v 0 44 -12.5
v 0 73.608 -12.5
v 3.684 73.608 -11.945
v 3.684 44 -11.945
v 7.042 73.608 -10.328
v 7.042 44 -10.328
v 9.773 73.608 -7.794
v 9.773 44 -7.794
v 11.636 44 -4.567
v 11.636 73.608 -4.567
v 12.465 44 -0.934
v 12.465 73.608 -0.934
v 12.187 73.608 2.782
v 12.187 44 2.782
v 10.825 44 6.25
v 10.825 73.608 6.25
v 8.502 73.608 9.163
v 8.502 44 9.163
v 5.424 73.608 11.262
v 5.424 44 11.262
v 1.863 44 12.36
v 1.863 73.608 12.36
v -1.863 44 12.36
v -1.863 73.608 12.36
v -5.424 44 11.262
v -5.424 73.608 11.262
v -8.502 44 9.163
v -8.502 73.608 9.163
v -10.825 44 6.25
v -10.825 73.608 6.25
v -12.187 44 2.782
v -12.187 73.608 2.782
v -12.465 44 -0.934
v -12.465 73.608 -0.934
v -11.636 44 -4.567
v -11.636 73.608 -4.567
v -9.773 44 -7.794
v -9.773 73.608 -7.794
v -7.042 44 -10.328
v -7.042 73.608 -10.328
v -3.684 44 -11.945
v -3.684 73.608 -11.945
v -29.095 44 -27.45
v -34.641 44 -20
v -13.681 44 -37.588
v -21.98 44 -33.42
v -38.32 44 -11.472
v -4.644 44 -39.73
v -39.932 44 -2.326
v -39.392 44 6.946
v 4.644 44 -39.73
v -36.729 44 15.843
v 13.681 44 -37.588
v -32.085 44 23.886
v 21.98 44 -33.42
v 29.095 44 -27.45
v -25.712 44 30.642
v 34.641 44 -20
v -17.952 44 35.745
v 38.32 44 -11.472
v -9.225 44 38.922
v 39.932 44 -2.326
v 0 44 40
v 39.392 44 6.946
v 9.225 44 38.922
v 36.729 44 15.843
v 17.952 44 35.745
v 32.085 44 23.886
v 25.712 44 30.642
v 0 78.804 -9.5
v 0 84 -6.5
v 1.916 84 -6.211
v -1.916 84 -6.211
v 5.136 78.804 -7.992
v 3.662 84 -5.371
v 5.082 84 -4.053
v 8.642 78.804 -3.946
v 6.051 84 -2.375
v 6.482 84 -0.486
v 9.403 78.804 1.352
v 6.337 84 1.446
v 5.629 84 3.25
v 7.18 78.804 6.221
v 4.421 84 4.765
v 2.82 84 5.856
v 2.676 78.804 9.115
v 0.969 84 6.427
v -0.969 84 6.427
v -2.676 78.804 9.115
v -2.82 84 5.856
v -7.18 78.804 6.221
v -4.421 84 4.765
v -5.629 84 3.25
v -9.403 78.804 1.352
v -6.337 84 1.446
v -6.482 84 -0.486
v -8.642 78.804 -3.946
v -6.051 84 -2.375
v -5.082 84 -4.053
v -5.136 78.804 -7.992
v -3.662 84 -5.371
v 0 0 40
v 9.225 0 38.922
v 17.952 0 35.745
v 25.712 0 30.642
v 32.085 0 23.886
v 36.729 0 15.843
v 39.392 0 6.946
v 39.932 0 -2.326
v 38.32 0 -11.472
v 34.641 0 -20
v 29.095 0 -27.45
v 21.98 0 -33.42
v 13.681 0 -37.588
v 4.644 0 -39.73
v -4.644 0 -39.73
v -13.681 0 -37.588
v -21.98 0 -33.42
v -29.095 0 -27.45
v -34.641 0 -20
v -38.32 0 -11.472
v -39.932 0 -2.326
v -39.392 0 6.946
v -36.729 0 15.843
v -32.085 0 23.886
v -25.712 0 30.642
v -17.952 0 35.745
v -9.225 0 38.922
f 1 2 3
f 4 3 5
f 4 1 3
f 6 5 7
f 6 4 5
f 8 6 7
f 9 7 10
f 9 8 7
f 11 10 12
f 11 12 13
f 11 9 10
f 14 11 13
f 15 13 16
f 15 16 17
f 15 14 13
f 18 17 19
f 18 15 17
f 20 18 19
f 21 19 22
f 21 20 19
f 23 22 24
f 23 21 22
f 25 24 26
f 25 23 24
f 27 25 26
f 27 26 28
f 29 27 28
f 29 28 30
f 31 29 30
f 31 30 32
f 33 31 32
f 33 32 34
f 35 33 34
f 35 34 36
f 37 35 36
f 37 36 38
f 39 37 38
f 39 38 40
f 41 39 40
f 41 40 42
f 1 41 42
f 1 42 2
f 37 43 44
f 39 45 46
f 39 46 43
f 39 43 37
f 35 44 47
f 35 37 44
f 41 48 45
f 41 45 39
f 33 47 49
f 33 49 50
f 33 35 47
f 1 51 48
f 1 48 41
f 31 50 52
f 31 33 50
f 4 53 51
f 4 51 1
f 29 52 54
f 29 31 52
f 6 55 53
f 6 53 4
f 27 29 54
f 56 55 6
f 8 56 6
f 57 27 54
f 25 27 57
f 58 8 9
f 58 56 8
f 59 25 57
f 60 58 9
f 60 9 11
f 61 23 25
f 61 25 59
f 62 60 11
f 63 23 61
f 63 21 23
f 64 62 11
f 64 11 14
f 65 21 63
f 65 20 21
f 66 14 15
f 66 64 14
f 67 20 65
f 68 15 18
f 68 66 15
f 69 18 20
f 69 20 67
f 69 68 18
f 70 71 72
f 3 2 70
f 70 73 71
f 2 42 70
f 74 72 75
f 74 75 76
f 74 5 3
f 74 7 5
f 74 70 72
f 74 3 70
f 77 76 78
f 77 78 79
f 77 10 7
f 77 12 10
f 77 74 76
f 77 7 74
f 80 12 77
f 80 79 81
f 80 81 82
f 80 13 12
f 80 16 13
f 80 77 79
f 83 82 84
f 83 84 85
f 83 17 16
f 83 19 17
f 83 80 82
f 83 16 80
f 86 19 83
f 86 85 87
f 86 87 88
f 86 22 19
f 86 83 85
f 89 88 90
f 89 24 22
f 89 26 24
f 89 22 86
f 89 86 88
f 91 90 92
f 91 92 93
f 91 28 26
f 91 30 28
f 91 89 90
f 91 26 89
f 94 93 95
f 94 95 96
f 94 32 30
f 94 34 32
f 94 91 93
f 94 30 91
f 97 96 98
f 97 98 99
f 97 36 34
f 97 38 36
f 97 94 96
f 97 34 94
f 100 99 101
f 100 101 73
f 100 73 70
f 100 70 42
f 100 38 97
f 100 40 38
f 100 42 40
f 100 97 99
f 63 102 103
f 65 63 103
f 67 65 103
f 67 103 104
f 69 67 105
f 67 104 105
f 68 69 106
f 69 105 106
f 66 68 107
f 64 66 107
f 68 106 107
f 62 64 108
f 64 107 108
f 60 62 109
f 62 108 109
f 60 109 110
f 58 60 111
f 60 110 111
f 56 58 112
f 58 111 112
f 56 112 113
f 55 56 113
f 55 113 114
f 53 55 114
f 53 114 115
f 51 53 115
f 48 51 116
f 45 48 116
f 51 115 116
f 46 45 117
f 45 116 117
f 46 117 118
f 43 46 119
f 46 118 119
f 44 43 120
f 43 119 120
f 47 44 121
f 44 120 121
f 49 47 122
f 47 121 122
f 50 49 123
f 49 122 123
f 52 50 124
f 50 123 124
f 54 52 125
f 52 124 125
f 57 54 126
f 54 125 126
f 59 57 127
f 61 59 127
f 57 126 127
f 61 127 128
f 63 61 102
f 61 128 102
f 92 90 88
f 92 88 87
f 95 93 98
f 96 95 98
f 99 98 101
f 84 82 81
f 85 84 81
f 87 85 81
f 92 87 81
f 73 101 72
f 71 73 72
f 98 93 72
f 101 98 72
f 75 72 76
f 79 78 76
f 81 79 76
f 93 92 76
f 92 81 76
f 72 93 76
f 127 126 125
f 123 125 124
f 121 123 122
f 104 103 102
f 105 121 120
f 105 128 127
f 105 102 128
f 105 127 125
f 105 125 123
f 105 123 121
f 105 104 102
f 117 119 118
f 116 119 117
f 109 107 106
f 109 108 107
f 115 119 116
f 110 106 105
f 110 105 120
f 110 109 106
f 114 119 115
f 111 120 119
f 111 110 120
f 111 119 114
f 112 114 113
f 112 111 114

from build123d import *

# Parameters (mm, degrees)
SKETCH_1_R      = 40
EXTRUDE_1_DEPTH = 44
SKETCH_3_R      = 12.5
EXTRUDE_2_DEPTH = 84
CHAMFER_1_SIZE  = 6
CHAMFER_1_SIZE2 = 10.392304845


with BuildPart() as part:
    # 草图1 → 凸台-拉伸1 (new body)
    with BuildSketch(Plane(origin=(0, 0, 0), x_dir=(1, 0, 0), z_dir=(0, 1, 0))):
        with Locations(Location((0, 0, 0), (0, 0, 270))):
            Circle(SKETCH_1_R)
    extrude(amount=EXTRUDE_1_DEPTH)

    # 草图3 → 凸台-拉伸2 (add)
    with BuildSketch(Plane.XZ):
        with Locations(Location((0, 0, 0), (0, 0, 270))):
            Circle(SKETCH_3_R)
    extrude(amount=-EXTRUDE_2_DEPTH)

    # 倒角1
    chamfer_1_edges = [part.edges().sort_by_distance(p)[0] for p in [
        (0, 84, 12.5),
    ]]
    chamfer_1_side = [part.faces().sort_by_distance(p)[0] for p in [
        (0, 84, 0),
    ]]
    chamfer(chamfer_1_edges, length=CHAMFER_1_SIZE, length2=CHAMFER_1_SIZE2, reference=chamfer_1_side[0])


solid = part.part
